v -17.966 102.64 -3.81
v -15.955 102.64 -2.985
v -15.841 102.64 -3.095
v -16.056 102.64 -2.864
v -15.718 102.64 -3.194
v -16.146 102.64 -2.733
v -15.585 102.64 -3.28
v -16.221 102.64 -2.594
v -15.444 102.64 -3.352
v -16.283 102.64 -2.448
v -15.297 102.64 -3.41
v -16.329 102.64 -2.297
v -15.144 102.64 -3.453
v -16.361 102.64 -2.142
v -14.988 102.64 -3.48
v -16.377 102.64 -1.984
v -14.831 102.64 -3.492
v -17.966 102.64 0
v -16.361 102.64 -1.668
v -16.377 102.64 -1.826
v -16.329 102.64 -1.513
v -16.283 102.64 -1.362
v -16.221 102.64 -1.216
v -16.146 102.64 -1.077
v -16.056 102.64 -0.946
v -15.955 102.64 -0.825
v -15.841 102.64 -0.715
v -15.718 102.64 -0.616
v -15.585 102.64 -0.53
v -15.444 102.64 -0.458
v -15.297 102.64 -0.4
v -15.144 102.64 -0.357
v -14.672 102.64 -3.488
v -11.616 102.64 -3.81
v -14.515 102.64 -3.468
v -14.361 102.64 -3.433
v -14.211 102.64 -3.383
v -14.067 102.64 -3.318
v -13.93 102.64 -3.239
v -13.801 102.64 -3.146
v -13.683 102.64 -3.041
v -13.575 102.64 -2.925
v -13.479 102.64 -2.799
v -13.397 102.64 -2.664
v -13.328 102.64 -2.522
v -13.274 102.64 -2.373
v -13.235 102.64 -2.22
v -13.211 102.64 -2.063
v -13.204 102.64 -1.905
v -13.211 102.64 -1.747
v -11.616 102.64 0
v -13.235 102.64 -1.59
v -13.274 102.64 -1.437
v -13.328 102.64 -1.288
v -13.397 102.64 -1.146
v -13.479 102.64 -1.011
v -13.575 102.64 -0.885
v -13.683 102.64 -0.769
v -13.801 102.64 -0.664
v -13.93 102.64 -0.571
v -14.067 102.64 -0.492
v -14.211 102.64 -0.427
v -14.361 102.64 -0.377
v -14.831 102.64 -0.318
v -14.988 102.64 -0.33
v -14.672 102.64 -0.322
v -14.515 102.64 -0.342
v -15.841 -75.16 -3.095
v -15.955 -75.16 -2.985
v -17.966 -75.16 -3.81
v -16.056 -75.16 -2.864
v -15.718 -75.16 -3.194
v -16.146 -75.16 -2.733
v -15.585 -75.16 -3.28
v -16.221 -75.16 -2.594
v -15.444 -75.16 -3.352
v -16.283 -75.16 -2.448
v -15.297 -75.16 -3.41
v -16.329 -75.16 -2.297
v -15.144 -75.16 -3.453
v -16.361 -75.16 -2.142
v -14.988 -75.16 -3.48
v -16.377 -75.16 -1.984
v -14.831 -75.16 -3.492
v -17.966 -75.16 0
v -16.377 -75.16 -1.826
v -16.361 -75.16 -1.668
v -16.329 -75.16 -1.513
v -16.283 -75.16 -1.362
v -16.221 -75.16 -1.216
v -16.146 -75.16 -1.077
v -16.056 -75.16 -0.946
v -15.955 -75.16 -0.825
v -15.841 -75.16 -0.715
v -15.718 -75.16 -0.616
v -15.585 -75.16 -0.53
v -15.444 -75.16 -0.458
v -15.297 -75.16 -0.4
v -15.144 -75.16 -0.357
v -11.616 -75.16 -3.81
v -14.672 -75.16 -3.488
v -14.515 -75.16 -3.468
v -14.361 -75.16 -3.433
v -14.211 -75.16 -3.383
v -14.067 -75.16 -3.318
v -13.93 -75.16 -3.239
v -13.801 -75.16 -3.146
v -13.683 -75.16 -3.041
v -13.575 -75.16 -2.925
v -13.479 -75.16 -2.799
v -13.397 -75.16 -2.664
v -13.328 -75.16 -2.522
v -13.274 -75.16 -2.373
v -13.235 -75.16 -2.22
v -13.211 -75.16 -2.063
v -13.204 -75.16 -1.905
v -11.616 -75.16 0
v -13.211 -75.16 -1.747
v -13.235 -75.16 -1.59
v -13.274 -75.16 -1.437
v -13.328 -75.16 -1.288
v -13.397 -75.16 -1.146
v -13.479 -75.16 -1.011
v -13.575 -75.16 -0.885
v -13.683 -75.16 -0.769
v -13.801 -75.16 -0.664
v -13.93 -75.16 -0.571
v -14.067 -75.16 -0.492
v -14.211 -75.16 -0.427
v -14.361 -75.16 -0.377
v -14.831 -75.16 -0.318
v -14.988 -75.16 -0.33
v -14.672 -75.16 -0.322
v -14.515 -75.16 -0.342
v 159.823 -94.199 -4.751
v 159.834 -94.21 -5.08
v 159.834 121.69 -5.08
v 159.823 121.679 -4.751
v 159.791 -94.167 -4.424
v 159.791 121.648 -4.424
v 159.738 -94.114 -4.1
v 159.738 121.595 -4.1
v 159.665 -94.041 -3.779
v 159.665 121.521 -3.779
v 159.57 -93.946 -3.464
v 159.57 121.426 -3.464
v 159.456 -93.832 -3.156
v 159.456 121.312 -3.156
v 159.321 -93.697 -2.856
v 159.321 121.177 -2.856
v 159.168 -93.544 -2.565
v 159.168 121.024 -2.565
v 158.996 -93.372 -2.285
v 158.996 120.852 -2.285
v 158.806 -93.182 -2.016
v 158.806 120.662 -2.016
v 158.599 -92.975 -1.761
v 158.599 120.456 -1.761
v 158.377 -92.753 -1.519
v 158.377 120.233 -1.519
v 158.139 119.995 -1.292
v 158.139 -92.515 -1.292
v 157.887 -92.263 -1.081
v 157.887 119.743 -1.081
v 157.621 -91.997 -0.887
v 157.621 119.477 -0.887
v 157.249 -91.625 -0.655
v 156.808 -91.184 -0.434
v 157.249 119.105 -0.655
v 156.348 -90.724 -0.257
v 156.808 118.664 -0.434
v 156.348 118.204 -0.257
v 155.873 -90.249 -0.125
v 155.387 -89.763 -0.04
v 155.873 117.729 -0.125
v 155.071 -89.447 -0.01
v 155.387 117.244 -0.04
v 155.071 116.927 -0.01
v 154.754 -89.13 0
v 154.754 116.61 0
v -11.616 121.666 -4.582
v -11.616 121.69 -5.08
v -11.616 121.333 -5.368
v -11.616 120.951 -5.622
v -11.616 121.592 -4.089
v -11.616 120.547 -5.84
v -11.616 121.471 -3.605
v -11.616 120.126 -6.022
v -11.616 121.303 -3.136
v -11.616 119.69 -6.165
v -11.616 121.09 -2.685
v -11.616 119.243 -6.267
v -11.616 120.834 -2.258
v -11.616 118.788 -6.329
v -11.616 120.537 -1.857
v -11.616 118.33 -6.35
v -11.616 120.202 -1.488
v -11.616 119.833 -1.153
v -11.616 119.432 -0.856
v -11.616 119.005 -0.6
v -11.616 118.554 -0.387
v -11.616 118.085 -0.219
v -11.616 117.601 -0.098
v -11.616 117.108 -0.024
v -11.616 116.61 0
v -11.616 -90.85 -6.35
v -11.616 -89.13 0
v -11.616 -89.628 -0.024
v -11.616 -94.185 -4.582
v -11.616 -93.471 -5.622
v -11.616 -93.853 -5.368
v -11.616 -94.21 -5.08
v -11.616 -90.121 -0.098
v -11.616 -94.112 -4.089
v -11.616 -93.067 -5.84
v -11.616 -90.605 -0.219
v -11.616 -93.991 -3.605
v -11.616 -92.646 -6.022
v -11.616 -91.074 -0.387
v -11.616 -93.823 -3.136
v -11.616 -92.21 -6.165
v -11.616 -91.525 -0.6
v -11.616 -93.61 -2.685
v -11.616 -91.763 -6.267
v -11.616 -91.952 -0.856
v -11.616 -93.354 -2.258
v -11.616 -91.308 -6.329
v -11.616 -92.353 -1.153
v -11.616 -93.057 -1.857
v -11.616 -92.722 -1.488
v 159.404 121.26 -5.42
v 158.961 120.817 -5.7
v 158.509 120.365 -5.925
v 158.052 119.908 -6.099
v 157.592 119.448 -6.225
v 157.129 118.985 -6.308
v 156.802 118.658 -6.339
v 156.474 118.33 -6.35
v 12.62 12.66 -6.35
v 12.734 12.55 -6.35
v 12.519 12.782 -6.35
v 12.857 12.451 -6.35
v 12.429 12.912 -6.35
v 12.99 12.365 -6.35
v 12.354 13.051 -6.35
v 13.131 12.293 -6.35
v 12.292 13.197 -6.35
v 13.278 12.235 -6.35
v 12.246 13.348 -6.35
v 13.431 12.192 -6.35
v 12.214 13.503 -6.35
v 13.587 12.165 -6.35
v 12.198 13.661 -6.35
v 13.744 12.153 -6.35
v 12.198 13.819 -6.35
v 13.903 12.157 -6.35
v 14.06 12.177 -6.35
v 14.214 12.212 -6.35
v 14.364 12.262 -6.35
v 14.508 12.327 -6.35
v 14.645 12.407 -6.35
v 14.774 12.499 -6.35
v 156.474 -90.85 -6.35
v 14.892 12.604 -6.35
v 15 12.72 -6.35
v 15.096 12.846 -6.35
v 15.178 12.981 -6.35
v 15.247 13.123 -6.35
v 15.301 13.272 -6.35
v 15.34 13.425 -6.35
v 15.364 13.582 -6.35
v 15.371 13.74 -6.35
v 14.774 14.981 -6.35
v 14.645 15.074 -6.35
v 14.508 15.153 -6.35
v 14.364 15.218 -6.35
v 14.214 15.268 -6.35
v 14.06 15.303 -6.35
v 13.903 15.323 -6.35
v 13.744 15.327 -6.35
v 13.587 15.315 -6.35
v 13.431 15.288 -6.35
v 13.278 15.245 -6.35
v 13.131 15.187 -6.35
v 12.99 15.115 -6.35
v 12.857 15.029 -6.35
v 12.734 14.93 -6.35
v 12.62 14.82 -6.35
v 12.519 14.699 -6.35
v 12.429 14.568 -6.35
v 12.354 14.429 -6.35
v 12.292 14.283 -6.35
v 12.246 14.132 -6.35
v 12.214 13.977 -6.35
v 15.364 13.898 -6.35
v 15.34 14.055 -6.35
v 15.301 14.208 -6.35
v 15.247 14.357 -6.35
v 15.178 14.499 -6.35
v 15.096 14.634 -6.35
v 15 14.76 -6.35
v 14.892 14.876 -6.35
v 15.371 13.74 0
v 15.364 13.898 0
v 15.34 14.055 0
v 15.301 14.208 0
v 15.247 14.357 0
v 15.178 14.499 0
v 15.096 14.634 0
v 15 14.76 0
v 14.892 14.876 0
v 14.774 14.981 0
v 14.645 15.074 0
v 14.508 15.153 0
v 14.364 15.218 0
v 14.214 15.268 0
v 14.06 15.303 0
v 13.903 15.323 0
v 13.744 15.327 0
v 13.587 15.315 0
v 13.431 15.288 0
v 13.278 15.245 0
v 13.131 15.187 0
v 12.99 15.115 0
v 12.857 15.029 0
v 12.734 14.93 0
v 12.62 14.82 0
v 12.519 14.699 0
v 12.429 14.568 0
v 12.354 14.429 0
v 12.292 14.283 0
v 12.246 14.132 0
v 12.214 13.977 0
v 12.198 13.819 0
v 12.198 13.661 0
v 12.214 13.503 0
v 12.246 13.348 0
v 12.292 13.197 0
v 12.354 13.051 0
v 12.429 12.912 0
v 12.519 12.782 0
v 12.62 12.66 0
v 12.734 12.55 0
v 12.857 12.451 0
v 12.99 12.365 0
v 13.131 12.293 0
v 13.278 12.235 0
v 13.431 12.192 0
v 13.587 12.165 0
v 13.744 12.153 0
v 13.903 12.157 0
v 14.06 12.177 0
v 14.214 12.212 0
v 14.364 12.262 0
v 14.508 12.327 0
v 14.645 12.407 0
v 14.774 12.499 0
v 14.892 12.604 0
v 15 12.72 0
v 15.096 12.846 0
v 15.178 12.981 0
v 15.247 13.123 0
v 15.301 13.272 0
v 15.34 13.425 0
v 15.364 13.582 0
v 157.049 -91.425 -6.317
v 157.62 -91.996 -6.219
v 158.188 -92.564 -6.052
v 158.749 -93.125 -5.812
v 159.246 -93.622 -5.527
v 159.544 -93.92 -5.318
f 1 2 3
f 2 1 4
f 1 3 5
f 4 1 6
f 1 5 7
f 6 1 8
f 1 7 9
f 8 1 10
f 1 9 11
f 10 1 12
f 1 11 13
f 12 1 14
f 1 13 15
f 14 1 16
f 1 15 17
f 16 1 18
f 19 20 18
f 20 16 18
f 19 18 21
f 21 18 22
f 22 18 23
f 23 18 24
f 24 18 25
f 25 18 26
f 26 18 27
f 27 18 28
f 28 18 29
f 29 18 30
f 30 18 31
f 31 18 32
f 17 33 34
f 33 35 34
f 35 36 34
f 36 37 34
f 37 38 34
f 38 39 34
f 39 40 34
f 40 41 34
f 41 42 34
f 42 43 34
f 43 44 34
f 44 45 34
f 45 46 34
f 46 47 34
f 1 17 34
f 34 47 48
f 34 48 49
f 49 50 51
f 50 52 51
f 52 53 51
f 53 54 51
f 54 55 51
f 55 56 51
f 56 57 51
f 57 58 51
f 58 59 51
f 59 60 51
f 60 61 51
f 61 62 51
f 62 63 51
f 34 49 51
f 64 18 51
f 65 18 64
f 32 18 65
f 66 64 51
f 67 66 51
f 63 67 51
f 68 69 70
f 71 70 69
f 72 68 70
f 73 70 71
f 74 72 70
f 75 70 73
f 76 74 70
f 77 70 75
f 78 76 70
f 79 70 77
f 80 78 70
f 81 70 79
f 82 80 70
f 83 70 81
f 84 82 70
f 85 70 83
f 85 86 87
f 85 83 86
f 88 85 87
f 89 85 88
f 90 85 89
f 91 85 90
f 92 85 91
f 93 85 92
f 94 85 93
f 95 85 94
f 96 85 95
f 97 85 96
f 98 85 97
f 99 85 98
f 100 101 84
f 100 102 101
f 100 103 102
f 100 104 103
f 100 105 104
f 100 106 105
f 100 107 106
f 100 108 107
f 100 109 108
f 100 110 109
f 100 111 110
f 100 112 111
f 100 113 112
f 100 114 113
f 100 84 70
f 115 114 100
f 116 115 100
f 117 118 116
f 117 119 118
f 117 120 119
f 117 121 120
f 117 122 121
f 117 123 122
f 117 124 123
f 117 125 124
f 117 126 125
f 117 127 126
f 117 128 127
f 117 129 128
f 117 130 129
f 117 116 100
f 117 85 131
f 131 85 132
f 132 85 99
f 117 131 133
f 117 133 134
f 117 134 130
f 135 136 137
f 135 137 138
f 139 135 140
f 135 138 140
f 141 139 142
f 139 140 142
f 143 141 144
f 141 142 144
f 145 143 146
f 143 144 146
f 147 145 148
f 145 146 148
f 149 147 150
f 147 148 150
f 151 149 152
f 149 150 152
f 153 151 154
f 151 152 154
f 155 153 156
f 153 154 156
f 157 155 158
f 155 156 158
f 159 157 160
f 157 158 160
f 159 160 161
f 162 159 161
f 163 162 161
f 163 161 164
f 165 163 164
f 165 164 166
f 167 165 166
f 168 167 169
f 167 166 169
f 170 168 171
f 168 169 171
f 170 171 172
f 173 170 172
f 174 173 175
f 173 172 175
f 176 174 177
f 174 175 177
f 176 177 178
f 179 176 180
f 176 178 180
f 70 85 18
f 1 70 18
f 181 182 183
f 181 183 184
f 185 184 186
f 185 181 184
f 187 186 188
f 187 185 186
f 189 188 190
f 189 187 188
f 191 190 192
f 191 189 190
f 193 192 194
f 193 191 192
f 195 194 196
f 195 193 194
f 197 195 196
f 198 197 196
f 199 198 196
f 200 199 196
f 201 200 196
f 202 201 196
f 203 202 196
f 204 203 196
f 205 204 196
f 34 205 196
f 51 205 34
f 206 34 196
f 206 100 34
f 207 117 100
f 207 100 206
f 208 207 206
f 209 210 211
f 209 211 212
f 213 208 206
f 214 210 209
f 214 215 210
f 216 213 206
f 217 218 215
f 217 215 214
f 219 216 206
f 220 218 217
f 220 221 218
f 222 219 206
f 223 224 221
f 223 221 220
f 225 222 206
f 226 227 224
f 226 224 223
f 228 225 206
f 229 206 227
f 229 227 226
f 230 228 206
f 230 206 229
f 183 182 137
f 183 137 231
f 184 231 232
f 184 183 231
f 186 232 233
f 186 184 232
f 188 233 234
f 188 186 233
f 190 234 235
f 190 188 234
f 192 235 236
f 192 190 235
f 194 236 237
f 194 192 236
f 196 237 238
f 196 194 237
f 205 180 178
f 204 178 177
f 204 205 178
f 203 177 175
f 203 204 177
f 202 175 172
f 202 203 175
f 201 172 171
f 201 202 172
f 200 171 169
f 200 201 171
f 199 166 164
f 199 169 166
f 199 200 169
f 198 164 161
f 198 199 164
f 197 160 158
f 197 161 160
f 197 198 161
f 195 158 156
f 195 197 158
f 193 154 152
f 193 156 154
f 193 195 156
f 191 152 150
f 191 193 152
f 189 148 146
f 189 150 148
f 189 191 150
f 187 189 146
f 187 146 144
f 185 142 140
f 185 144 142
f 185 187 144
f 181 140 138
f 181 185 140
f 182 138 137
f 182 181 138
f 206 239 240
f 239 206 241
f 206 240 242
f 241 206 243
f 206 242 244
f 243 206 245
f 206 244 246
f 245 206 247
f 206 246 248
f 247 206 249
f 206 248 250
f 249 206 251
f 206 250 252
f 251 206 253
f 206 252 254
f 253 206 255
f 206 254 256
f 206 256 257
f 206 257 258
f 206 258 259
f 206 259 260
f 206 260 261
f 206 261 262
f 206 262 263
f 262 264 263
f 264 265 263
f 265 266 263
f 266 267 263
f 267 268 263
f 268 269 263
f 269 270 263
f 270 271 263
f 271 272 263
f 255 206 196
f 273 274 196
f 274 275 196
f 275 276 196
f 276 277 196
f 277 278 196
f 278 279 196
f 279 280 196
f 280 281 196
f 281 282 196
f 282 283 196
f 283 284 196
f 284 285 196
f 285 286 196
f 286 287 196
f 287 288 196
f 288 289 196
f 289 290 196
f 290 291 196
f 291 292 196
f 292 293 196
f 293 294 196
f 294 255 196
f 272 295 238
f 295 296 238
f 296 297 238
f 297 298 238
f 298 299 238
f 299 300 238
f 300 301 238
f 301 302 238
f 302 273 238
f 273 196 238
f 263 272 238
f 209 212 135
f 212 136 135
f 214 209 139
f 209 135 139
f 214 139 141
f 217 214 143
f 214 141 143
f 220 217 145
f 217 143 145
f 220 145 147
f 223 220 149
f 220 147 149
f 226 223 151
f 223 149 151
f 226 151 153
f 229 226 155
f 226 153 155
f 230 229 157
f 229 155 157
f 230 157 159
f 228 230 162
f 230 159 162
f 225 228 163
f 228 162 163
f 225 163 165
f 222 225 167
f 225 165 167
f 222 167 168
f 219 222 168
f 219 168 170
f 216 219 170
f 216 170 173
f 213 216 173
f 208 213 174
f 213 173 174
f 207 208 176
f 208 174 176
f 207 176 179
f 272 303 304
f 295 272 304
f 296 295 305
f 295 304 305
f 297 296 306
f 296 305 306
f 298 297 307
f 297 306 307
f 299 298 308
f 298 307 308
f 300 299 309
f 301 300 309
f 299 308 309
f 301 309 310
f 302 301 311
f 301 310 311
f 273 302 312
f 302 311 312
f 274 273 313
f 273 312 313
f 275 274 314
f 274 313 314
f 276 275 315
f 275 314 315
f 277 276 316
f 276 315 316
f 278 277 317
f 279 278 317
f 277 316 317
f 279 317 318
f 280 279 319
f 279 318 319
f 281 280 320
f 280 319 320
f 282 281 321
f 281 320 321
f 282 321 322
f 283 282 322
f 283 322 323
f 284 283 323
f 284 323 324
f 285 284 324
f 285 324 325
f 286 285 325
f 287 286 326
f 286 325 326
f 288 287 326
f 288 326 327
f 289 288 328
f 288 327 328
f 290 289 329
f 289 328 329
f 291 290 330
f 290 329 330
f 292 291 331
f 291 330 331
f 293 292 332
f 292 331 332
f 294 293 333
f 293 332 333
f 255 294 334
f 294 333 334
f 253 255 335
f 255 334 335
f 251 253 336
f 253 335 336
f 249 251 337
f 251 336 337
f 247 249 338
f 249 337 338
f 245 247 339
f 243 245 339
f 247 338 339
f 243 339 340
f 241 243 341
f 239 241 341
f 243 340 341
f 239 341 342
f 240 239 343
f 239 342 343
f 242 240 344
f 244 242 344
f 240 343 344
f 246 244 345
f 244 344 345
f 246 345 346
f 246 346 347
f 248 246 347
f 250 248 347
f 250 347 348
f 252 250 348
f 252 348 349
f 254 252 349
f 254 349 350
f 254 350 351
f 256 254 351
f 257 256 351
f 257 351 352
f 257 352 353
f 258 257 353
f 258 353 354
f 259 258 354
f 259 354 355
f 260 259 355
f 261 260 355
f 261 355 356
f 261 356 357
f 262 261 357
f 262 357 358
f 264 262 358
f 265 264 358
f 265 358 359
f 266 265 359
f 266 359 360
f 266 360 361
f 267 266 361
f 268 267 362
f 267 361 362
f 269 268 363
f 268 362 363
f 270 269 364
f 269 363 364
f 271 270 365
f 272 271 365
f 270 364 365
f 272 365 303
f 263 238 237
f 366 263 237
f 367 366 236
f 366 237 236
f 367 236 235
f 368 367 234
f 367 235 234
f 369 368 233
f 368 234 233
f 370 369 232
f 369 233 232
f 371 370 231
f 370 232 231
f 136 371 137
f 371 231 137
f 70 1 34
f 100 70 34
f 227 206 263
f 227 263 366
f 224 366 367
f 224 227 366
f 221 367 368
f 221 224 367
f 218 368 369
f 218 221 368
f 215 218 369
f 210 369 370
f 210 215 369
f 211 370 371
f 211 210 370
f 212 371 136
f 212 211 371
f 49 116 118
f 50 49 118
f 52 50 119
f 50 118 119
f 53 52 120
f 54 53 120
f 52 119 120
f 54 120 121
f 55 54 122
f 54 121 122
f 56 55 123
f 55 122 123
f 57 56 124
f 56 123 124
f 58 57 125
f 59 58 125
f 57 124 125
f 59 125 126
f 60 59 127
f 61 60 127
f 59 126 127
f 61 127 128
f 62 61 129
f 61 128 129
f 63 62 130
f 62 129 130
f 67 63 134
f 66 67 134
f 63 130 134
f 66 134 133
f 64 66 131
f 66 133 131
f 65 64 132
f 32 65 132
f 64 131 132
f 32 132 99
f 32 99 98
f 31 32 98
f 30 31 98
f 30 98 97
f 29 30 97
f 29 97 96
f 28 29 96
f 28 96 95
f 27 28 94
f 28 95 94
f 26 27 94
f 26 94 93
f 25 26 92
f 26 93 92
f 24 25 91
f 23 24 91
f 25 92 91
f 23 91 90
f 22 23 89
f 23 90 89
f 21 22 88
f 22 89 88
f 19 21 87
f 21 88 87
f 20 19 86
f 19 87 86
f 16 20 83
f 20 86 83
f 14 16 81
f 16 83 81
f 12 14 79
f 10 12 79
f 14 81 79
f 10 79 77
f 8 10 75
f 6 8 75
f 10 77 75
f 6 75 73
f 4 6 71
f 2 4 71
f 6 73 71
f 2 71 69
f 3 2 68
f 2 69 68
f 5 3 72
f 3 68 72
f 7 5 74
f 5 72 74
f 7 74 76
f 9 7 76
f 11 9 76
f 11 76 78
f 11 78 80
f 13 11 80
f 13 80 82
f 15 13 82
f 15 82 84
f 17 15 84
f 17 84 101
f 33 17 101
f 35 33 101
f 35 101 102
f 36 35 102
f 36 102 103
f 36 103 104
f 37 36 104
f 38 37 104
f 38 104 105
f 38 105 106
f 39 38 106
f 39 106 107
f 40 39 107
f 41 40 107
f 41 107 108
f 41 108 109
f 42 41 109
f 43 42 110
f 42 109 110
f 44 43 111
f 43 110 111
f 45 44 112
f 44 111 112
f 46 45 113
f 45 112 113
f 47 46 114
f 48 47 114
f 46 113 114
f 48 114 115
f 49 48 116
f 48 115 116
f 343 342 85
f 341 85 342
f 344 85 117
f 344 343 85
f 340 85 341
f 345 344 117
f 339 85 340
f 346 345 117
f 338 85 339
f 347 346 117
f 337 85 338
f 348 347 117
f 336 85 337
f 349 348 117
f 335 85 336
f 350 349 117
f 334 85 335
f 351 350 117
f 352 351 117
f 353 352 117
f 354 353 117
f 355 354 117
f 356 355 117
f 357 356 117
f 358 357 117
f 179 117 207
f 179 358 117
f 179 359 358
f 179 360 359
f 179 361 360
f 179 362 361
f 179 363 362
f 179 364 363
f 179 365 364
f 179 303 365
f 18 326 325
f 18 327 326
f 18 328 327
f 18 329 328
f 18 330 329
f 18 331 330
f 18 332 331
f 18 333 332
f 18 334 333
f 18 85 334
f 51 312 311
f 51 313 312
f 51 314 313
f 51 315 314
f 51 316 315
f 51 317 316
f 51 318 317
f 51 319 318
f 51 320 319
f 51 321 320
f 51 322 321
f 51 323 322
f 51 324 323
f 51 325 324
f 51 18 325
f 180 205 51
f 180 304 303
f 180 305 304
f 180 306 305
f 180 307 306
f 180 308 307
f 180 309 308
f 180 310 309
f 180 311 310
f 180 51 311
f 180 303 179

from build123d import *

# Parameters (mm, degrees)
F1_DEPTH    = 6.35
F0_W        = 6.35
F0_H        = 177.8
F2_DEPTH    = 3.81
F3_R        = 1.5875
F4_DEPTH    = 177.8
F5_R        = 1.5875
F6_DEPTH    = 6.35
F7_R        = 5.08
F8_T1_DEPTH = 232.7005208253
F8_T3_DEPTH = 188.2505208253


# Not quite as in the source:
# - a fillet or chamfer that OpenCascade refuses, or shapes differently, is made with other operations: its cross-section is extruded or revolved along the edge and cut away or added


with BuildPart() as f1:
    # F0 (on Top) → F1 (new body)
    with BuildSketch(Plane.XY):
        Polygon((-11.6160511255, 102.6400476694), (-11.6160511255, -75.1599523306), (-11.6160511255, -94.2099523306), (159.8339488745, -94.2099523306), (159.8339488745, 121.6900476694), (-11.6160511255, 121.6900476694), align=None)
    extrude(amount=-F1_DEPTH)

    # F0 (on Top) → F2 (join)
    with BuildSketch(Plane.XY):
        with Locations((-14.7910511255, 13.7400476694)):
            Rectangle(F0_W, F0_H)
    extrude(amount=-F2_DEPTH)

    # F3 (on face) → F4 (cut)
    with BuildSketch(Plane.XZ.offset(75.1599523306)):
        with Locations((-14.7910511255, -1.905)):
            Circle(F3_R)
    extrude(amount=-F4_DEPTH, mode=Mode.SUBTRACT)

    # F5 (on face) → F6 (cut)
    with BuildSketch(Plane.XY):
        with Locations((13.7839488745, 13.7400476694)):
            Circle(F5_R)
    extrude(amount=-F6_DEPTH, mode=Mode.SUBTRACT)

    # F7
    f7_edges = [f1.edges().sort_by_distance(p)[0] for p in [
        (74.108949, -94.209952, 0),
        (159.833949, 13.740048, 0),
        (74.108949, 121.690048, 0),
    ]]
    fillet(f7_edges, radius=F7_R)

    # F8: fillet of radius 5.08 on 3 edges, made by hand

    # F8_s2 → F8_t1 (cut)
    with BuildSketch(Plane.XZ.offset(-130.090308082)):
        with BuildLine():
            ThreePointArc((156.4738447094, -6.35), (158.2698959336, -6.0219048812), (159.8339488745, -5.08))
            Line((159.8339488745, -5.08), (159.8339488745, -6.35))
            Line((159.8339488745, -6.35), (156.4738447094, -6.35))
        make_face()
    extrude(amount=F8_T1_DEPTH, mode=Mode.SUBTRACT)

    # F8_s4 → F8_t3 (cut)
    with BuildSketch(Plane.YZ.offset(-20.0163115382)):
        with BuildLine():
            ThreePointArc((-90.8498481655, -6.35), (-92.6458993898, -6.0219048812), (-94.2099523306, -5.08))
            Line((-94.2099523306, -5.08), (-94.2099523306, -6.35))
            Line((-94.2099523306, -6.35), (-90.8498481655, -6.35))
        make_face()
        with BuildLine():
            ThreePointArc((121.6900476694, -5.08), (120.1259947286, -6.0219048812), (118.3299435044, -6.35))
            Line((118.3299435044, -6.35), (121.6900476694, -6.35))
            Line((121.6900476694, -6.35), (121.6900476694, -5.08))
        make_face()
    extrude(amount=F8_T3_DEPTH, mode=Mode.SUBTRACT)


solid = f1.part
